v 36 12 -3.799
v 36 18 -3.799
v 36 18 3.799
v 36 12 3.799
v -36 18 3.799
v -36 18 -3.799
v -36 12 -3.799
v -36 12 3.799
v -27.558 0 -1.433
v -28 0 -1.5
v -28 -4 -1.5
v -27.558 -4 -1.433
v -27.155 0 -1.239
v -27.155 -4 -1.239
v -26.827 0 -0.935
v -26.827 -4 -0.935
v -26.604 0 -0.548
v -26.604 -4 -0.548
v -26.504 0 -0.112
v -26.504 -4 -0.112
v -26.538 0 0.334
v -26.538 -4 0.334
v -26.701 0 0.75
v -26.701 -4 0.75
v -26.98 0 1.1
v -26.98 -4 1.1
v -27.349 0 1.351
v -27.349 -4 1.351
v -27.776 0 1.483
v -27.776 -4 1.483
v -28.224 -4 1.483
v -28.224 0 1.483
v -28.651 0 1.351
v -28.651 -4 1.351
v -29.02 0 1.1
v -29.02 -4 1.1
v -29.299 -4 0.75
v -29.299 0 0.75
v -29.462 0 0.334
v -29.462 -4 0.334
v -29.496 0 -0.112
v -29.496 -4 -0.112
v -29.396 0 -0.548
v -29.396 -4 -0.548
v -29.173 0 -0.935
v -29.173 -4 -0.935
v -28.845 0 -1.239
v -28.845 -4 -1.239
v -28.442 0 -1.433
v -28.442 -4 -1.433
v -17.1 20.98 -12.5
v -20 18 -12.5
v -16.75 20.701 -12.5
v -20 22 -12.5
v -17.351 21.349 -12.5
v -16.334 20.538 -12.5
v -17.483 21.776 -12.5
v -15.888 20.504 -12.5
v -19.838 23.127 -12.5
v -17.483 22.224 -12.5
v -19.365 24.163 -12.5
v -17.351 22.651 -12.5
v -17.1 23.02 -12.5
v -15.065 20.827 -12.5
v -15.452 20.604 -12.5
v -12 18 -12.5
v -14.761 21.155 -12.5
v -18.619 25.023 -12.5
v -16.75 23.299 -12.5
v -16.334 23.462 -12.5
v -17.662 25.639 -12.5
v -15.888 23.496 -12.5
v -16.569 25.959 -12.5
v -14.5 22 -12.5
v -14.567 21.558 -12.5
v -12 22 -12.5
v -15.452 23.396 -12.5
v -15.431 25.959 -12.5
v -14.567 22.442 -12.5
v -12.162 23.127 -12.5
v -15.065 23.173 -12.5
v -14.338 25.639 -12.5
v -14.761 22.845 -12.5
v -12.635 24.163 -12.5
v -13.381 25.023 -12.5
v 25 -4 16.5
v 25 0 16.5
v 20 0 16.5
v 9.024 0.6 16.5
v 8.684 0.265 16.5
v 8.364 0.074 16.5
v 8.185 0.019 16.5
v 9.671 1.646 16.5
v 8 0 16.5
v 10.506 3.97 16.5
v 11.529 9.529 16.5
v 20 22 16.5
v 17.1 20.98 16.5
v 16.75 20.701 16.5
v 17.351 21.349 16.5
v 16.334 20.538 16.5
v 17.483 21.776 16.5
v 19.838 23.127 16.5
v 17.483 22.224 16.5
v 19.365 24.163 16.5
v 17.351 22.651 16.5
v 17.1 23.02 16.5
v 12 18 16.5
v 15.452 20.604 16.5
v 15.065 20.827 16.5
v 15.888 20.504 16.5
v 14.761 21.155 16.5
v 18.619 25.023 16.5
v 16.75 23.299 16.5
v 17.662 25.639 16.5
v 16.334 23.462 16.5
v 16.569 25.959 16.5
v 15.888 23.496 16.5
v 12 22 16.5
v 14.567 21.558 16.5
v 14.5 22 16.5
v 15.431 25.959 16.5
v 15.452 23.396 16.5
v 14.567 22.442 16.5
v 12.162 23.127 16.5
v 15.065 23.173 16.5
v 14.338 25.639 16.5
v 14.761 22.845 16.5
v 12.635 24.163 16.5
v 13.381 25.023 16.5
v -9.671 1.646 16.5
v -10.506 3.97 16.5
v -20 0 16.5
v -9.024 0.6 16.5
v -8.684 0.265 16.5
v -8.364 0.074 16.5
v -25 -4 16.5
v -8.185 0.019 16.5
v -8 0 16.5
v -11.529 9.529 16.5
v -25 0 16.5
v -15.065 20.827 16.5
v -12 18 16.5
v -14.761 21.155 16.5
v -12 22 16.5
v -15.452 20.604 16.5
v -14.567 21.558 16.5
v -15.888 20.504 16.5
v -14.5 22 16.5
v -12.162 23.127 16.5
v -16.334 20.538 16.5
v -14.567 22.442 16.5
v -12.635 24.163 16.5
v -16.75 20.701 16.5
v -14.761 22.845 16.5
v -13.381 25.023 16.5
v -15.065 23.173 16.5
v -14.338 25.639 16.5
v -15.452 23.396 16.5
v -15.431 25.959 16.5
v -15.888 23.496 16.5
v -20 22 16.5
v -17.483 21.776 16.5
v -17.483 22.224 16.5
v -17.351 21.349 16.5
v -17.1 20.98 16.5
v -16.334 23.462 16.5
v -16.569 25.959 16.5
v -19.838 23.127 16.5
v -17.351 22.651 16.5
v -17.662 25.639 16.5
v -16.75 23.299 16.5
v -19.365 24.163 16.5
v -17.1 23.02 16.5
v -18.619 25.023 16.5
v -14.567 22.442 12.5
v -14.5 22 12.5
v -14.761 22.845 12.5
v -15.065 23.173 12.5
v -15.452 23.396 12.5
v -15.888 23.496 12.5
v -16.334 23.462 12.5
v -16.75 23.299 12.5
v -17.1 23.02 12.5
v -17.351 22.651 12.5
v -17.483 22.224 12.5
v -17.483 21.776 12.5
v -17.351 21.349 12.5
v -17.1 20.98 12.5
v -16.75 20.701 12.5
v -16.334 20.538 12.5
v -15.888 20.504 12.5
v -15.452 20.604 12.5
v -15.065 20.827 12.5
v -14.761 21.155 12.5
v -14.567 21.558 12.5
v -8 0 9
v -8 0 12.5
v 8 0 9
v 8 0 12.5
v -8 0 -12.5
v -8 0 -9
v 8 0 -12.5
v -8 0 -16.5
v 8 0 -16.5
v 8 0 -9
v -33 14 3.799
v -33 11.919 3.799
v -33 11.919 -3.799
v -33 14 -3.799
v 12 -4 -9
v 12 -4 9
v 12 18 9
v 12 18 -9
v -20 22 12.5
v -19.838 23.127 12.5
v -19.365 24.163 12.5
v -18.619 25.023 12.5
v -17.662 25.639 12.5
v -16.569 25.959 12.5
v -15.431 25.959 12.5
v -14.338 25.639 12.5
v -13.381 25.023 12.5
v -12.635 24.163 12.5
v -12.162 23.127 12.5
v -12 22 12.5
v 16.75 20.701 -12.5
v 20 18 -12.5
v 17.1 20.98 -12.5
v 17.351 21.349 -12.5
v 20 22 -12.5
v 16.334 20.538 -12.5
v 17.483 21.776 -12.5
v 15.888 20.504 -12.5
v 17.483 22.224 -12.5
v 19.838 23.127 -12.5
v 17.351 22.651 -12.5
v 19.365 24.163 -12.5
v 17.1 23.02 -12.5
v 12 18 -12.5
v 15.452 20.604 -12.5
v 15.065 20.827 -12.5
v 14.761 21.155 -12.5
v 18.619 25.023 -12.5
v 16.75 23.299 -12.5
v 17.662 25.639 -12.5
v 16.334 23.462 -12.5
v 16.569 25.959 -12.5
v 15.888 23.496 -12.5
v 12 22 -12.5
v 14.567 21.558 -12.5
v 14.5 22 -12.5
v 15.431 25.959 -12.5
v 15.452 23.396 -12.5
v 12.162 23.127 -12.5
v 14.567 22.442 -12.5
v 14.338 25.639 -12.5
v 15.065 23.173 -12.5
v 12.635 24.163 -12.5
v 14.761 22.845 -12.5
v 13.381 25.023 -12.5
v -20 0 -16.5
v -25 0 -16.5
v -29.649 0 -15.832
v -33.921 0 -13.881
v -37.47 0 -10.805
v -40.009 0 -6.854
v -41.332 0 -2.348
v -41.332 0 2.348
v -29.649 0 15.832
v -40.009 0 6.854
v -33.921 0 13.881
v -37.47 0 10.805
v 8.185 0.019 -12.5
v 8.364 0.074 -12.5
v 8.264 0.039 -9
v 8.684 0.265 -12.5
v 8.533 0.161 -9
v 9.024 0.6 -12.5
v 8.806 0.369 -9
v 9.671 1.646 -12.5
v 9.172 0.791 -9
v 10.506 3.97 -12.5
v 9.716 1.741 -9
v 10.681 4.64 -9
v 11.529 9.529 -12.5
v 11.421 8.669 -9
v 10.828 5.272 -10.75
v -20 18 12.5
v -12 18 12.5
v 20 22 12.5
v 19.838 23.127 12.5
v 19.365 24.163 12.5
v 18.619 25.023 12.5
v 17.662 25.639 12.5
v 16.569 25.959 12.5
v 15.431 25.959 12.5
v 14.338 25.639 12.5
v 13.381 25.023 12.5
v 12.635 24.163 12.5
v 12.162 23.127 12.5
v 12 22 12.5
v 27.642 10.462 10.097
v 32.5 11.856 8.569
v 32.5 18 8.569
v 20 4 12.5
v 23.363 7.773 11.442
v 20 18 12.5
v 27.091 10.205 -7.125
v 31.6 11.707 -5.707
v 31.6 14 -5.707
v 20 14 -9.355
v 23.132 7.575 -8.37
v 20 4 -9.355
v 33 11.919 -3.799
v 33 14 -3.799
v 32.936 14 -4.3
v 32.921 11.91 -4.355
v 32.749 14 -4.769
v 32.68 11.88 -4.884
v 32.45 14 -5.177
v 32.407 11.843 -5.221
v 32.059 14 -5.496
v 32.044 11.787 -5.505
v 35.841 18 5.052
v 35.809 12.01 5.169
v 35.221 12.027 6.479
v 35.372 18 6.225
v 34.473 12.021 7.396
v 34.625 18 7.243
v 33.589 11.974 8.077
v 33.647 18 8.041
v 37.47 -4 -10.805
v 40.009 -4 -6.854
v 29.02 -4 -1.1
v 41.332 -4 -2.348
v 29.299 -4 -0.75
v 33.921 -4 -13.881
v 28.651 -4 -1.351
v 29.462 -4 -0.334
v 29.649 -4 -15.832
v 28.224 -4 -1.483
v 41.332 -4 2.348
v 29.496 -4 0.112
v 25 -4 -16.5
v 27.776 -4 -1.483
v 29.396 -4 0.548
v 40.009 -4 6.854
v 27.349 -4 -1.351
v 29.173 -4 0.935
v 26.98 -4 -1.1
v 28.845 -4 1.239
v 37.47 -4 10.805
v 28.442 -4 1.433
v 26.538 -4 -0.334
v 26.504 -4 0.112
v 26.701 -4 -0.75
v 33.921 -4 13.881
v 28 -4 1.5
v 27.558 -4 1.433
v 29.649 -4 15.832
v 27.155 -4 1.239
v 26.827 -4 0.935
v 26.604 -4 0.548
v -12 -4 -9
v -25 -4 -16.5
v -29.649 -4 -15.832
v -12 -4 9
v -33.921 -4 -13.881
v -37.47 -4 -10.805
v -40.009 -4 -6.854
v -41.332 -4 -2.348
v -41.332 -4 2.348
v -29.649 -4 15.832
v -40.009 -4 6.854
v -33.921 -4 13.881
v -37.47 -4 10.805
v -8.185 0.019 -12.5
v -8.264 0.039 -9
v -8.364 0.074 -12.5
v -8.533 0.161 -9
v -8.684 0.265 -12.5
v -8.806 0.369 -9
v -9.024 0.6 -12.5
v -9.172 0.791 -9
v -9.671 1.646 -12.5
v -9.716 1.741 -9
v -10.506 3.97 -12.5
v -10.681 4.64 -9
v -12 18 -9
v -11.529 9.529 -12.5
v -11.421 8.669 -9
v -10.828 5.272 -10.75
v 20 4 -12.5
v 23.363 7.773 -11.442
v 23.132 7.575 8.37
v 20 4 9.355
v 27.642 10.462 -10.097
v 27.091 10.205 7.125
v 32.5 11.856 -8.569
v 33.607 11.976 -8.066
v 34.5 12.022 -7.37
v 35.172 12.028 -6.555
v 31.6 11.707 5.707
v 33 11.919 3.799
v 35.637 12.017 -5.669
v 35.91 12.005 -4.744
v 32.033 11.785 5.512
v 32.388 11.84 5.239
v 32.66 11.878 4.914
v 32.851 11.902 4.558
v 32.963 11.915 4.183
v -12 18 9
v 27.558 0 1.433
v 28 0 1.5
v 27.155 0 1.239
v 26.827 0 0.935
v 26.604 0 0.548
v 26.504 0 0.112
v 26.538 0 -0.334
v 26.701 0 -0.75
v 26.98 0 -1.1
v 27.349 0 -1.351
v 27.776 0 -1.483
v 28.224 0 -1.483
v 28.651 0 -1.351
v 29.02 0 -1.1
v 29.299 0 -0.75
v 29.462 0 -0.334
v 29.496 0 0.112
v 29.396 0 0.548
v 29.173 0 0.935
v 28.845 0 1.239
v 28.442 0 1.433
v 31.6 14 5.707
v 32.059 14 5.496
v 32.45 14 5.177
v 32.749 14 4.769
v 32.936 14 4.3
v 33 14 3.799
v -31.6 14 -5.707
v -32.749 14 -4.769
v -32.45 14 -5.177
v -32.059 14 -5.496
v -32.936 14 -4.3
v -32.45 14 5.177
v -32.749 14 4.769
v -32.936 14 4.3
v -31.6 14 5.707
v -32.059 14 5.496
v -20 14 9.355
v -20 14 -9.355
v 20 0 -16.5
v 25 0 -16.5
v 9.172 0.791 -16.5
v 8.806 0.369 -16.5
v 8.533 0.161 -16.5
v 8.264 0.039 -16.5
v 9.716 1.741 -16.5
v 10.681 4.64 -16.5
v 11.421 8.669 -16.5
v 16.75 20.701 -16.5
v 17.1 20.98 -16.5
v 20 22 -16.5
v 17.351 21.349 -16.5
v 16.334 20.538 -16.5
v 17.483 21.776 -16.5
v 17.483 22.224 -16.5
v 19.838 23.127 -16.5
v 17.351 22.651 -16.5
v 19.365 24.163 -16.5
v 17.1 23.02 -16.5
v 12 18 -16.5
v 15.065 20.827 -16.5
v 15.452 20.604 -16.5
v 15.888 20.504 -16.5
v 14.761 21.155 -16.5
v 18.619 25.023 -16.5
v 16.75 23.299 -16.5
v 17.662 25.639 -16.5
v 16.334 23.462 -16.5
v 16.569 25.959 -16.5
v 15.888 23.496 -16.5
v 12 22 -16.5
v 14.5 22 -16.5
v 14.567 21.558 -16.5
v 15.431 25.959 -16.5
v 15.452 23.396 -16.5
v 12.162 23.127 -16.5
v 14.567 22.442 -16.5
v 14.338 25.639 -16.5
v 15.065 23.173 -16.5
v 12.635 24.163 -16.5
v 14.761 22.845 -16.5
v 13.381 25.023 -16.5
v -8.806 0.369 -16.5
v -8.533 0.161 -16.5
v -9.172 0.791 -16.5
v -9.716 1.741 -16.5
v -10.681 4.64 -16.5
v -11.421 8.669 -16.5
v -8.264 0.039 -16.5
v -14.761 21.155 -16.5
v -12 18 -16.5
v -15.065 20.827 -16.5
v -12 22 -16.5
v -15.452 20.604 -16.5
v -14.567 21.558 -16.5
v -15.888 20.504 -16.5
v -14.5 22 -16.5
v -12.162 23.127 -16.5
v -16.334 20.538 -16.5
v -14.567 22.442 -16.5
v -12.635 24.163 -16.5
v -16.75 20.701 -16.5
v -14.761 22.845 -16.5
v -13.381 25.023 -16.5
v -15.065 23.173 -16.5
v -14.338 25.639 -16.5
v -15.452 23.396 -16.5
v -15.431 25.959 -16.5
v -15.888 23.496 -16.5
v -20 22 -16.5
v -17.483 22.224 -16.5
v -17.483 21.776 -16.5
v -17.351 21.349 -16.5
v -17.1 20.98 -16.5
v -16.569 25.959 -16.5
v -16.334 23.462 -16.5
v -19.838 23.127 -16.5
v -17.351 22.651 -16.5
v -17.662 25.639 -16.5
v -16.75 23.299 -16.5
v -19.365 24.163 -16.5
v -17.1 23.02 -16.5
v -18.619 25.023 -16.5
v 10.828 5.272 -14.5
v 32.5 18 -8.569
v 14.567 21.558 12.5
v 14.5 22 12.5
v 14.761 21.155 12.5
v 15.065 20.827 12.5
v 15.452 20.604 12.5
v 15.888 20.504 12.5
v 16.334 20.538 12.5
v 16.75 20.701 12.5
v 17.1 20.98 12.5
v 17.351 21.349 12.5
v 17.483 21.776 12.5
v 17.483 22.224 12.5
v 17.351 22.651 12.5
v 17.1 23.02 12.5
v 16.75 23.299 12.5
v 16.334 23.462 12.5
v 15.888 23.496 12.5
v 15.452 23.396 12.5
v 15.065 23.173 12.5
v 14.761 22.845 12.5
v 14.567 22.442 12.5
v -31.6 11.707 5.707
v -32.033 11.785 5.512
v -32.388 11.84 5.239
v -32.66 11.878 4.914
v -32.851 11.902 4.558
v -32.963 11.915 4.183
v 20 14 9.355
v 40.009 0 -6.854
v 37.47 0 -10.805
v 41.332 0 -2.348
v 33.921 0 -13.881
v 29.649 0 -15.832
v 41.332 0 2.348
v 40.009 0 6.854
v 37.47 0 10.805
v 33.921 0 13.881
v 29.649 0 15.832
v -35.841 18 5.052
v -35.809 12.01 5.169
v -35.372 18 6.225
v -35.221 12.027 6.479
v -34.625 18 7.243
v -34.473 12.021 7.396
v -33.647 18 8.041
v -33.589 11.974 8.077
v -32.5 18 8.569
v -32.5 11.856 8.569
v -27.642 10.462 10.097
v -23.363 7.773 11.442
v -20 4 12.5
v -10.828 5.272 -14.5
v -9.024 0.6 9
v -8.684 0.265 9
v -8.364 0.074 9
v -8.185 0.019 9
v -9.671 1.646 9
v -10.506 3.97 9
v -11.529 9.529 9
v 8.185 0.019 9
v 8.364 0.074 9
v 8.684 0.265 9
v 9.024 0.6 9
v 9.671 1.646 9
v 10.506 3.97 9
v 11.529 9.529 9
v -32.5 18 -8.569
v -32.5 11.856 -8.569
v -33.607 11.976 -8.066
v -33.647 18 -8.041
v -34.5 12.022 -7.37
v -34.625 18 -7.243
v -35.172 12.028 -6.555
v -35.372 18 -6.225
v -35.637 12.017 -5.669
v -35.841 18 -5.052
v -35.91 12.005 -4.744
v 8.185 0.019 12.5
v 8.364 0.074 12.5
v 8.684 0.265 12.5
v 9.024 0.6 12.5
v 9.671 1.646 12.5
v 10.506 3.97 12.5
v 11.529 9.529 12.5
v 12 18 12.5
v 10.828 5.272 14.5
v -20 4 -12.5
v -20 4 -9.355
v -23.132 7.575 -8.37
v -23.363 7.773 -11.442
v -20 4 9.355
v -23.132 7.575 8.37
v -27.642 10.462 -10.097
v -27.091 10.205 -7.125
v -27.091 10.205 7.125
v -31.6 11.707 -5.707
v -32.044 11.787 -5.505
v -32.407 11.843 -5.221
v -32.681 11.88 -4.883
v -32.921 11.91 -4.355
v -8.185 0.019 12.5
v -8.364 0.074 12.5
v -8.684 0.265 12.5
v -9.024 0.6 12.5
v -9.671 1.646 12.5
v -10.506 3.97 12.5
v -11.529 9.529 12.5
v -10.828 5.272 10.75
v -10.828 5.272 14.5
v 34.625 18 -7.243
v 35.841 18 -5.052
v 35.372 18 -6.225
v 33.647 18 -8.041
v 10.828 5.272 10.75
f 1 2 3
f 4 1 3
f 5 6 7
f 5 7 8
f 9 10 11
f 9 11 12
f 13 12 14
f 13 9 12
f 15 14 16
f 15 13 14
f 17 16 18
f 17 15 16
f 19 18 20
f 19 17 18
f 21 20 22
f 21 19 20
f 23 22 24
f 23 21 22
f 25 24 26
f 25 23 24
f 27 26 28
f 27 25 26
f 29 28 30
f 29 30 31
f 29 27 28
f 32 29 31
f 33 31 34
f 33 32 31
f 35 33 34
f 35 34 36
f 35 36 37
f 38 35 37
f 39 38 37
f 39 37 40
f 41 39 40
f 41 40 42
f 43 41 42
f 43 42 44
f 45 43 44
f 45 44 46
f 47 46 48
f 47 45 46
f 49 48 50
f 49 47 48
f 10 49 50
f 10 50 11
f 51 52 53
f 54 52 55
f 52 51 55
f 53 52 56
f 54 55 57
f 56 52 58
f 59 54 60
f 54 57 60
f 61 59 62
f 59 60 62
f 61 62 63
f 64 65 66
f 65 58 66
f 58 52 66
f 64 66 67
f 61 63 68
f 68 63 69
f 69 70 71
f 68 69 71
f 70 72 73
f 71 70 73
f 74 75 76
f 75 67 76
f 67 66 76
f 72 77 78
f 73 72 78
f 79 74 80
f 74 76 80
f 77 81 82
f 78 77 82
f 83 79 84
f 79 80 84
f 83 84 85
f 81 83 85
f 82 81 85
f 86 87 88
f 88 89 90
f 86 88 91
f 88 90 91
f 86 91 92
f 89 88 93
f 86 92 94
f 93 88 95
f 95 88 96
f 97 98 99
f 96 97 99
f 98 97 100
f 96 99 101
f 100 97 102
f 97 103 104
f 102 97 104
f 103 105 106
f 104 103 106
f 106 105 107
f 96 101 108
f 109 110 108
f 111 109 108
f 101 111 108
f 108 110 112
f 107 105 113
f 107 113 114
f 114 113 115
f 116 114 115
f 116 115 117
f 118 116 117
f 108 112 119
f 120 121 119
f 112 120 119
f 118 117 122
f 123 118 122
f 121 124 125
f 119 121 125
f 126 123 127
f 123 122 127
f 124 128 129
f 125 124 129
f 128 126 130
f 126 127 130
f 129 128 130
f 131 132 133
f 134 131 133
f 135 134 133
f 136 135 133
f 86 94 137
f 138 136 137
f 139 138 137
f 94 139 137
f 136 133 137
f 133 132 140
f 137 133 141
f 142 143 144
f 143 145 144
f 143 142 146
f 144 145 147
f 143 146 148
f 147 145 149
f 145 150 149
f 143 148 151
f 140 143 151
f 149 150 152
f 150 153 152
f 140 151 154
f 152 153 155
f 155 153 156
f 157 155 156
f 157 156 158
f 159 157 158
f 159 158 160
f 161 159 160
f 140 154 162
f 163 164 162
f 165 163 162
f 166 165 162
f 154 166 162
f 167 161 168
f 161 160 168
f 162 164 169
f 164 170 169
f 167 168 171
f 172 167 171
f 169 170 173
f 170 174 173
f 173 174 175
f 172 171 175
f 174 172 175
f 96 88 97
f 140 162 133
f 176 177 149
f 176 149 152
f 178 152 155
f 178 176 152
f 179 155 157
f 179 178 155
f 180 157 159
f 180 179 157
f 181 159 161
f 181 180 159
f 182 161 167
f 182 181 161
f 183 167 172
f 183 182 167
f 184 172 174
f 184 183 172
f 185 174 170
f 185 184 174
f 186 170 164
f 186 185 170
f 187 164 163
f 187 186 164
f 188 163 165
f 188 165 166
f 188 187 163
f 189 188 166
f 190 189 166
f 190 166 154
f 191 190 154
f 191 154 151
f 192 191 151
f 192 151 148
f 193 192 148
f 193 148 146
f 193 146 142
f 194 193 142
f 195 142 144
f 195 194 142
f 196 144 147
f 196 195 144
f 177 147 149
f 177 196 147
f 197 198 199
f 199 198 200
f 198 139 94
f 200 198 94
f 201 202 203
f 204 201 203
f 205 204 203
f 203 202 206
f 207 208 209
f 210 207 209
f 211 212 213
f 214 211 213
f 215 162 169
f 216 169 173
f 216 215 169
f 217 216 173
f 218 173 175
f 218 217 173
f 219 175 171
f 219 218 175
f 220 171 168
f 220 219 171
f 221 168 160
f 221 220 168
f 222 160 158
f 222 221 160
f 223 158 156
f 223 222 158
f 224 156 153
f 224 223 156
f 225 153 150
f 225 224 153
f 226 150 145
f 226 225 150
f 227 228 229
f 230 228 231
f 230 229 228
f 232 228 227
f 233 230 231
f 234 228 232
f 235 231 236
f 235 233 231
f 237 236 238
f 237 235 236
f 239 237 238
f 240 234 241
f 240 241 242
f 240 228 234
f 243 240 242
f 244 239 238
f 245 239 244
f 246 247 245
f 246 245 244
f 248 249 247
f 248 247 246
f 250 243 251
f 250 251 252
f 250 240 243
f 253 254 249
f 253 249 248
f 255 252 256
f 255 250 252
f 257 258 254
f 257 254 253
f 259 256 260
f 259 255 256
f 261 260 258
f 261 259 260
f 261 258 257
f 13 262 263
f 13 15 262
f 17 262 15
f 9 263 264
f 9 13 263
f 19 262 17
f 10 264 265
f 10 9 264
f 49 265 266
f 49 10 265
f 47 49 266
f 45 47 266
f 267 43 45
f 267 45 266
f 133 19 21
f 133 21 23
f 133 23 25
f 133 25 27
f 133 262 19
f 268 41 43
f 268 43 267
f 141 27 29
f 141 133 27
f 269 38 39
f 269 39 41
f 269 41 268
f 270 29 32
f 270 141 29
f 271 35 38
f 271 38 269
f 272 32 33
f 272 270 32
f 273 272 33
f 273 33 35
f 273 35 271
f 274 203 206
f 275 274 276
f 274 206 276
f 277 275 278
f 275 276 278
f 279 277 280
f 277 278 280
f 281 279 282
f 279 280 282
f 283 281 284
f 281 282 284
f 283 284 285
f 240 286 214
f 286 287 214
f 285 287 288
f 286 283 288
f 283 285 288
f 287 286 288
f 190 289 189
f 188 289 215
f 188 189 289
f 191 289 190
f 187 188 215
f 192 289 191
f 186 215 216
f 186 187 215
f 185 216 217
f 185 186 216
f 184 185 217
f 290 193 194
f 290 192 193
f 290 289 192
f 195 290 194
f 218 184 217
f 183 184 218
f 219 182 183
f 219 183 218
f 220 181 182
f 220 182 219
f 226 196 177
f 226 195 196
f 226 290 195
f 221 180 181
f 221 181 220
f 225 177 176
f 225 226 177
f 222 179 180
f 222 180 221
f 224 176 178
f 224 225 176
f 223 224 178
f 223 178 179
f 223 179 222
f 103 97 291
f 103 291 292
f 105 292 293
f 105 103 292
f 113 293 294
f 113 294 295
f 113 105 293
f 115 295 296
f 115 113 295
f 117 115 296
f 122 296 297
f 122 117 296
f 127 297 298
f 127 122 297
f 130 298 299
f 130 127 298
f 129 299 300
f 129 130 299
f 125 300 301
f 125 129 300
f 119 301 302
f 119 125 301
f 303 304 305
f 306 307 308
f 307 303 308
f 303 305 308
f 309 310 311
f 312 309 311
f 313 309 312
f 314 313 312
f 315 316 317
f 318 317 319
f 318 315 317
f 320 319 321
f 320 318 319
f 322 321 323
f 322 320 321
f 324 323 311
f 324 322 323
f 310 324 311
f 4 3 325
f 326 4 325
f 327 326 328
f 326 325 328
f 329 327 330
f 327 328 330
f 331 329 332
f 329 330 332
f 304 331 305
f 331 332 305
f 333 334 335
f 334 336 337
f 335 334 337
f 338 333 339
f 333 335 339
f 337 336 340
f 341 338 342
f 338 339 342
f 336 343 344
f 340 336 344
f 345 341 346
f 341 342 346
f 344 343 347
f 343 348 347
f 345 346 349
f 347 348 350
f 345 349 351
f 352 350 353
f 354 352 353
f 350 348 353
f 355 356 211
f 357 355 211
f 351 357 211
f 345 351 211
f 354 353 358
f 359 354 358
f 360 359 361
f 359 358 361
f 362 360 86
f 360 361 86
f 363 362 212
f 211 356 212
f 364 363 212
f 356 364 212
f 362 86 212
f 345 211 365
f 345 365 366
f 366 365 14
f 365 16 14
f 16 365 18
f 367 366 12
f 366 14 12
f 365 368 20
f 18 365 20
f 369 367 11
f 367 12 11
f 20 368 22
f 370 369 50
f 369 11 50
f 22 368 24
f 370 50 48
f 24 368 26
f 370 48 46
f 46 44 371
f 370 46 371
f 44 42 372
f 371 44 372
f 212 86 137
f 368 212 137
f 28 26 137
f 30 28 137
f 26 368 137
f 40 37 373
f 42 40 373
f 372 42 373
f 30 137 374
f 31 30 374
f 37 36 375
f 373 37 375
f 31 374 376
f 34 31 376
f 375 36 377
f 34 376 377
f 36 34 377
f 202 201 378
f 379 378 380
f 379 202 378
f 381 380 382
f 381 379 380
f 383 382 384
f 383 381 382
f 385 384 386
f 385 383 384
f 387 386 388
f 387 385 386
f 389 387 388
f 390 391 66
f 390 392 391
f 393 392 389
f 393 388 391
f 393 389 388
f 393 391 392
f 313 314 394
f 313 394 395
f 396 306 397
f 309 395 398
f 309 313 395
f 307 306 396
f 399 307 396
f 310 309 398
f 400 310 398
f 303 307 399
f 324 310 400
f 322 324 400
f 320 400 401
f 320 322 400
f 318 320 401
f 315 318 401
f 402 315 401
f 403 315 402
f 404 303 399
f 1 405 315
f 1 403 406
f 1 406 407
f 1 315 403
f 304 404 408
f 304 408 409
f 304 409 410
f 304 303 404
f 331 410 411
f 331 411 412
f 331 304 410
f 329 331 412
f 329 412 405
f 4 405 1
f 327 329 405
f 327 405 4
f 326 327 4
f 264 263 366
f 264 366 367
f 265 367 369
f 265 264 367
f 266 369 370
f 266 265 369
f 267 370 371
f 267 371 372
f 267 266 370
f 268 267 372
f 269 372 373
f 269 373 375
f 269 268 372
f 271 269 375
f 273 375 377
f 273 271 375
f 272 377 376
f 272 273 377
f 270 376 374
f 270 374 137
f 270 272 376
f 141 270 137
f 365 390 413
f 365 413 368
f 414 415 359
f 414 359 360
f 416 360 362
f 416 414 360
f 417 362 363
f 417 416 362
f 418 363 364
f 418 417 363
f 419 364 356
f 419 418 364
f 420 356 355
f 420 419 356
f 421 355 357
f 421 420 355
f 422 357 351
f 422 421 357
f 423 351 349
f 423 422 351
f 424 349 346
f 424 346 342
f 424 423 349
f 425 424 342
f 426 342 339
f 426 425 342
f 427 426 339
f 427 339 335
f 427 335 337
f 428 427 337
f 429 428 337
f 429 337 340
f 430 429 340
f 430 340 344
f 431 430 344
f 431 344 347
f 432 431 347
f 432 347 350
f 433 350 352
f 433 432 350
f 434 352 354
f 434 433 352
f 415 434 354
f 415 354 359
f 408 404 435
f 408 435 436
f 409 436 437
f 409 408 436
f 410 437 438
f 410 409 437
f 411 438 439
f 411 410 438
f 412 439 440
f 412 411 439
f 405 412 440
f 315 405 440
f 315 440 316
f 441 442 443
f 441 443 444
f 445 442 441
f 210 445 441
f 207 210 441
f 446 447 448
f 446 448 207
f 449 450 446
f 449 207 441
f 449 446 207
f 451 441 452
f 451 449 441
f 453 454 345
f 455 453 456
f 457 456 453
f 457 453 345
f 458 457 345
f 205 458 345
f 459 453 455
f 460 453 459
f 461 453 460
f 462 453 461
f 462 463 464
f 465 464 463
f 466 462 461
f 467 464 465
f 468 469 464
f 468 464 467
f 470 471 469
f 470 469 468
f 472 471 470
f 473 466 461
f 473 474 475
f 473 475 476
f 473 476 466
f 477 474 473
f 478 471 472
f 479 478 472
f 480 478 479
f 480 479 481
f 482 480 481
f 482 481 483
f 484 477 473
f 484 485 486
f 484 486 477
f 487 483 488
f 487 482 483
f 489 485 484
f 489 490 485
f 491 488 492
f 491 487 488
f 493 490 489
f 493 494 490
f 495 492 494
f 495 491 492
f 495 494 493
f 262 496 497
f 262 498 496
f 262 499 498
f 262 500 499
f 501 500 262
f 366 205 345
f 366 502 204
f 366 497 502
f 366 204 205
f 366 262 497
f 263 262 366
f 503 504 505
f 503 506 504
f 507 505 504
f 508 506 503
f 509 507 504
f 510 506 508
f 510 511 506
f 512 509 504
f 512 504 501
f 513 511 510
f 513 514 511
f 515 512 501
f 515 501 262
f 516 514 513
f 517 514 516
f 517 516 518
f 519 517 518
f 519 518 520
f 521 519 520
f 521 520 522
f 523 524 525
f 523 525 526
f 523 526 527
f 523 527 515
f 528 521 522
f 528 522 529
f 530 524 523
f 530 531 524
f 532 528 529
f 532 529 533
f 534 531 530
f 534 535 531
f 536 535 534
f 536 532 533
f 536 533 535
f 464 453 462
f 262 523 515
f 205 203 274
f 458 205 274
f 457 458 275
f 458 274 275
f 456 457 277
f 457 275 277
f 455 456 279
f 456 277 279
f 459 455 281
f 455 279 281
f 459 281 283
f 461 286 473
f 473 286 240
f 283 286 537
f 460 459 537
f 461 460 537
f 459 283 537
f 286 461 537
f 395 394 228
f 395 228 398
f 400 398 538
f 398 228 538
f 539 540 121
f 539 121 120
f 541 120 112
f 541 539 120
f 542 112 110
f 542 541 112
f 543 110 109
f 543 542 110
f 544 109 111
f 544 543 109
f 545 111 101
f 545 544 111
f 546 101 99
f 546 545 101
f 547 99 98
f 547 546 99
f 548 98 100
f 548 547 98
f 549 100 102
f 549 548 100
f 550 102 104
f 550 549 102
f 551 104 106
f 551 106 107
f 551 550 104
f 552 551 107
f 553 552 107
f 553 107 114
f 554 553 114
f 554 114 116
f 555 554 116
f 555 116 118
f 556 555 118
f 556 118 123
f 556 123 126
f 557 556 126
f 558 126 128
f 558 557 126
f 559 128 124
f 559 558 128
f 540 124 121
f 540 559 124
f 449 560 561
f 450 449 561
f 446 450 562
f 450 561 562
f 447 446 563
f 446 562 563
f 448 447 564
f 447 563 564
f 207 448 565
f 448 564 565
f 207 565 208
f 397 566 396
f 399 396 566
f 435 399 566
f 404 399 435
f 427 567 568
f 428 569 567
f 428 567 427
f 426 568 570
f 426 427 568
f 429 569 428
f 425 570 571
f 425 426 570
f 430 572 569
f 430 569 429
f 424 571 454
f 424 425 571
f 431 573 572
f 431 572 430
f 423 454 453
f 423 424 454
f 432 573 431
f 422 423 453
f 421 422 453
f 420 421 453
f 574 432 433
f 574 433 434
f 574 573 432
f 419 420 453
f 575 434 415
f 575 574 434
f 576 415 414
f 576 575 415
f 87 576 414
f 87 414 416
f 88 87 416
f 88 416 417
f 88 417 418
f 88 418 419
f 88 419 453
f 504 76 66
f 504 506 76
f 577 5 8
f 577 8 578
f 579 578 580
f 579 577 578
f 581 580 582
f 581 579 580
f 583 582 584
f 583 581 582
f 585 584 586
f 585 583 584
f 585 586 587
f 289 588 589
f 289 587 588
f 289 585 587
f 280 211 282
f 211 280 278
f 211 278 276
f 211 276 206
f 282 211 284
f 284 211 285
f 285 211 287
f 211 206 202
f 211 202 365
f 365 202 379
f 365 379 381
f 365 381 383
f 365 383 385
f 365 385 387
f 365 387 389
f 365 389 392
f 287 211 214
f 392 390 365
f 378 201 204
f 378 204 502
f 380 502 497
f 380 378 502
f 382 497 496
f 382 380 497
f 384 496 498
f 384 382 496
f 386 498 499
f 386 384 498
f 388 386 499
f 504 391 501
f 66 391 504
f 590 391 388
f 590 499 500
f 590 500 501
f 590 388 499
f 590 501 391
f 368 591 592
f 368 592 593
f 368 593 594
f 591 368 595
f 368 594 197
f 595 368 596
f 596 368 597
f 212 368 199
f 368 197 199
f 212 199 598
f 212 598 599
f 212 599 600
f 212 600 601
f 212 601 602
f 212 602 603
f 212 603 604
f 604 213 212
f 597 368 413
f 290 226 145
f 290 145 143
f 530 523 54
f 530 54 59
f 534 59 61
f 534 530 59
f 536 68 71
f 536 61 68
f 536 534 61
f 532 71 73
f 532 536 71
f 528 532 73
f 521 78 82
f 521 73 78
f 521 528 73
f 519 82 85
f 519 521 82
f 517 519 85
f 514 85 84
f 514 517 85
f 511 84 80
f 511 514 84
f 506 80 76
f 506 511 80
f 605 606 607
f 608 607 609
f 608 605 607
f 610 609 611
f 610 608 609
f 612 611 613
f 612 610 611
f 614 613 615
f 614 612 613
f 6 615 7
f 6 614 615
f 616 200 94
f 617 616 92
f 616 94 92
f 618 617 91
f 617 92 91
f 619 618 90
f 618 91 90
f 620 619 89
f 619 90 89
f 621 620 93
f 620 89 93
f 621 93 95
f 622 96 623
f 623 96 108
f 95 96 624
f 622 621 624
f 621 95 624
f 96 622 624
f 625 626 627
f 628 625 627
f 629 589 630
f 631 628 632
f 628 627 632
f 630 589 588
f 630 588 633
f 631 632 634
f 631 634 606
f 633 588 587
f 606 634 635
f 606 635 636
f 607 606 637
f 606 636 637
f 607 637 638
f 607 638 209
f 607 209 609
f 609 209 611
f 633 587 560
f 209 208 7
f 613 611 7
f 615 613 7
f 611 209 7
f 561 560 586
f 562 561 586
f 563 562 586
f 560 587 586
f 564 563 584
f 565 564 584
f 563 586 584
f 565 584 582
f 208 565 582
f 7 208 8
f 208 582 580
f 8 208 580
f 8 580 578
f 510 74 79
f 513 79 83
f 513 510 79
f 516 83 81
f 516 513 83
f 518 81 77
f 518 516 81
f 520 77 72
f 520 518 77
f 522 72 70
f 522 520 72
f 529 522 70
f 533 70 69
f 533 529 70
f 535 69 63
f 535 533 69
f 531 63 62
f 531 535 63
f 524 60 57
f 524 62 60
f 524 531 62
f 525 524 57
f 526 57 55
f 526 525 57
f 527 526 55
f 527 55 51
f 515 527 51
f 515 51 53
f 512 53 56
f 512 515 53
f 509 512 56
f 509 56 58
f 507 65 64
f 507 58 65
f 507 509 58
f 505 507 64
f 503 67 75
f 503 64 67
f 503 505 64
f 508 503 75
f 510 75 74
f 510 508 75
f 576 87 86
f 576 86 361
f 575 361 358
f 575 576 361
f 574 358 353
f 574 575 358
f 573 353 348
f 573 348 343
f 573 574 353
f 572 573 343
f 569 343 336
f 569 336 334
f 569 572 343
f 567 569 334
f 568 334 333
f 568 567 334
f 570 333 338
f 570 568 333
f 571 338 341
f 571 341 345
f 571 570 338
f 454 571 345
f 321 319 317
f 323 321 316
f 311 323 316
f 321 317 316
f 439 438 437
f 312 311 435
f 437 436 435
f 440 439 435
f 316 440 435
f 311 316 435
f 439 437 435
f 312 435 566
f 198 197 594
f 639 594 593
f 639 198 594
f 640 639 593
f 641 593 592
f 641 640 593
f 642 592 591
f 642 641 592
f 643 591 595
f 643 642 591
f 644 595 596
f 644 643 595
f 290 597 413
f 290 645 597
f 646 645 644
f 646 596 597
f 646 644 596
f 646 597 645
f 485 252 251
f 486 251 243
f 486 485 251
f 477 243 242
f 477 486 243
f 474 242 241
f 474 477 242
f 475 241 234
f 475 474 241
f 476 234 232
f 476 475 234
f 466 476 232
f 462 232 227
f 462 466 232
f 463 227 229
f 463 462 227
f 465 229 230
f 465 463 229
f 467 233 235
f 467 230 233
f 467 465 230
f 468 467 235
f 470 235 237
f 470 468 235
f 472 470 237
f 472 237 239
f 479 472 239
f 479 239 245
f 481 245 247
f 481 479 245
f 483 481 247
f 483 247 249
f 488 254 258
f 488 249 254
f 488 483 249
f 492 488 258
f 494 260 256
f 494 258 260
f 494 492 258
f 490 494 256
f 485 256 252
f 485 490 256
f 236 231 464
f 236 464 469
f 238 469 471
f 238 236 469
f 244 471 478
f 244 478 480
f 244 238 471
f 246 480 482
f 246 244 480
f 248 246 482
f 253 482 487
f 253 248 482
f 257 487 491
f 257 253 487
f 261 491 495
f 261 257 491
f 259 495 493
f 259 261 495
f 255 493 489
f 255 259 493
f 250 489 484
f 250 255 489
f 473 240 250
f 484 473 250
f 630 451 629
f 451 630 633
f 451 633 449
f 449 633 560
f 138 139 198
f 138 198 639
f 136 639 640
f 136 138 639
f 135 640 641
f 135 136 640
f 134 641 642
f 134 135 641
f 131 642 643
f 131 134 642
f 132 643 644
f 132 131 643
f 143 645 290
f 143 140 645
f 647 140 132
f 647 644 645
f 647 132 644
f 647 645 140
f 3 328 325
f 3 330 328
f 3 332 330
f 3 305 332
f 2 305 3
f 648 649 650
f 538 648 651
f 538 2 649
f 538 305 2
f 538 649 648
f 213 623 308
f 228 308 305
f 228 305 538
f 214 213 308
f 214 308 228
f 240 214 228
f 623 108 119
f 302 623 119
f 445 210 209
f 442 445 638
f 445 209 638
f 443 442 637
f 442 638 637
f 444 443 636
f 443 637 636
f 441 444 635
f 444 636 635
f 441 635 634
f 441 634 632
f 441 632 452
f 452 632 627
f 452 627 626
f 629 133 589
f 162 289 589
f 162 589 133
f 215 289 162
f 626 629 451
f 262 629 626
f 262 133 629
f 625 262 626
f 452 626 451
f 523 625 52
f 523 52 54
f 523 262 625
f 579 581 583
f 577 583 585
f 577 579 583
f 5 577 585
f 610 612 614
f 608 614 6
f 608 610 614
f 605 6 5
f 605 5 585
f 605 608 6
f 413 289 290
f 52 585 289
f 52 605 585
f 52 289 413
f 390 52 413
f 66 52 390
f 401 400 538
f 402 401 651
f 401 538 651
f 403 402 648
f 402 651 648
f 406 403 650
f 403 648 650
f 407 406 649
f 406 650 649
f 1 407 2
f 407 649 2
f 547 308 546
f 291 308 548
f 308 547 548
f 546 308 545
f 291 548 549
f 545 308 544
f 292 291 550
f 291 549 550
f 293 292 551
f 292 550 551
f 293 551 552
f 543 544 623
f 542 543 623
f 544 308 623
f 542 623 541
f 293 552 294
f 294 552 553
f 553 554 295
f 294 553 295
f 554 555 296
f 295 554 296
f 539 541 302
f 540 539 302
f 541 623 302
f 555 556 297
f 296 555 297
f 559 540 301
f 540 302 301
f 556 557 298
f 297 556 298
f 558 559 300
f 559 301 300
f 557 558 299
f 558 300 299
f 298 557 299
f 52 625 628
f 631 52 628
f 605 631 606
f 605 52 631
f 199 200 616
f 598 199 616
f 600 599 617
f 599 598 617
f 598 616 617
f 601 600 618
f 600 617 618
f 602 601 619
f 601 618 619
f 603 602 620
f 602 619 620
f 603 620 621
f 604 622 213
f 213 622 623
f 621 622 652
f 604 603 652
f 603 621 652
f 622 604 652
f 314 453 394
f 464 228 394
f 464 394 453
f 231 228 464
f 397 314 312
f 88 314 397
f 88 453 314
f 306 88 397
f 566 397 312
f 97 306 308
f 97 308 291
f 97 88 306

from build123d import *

# Parameters (mm, degrees)
SKETCH1_W                      = 32
SKETCH1_H                      = 33
BOSS_EXTRUDE1_DEPTH            = 18
SHELL1_T                       = -4
SKETCH2_R                      = 1.5
BOSS_EXTRUDE2_DEPTH            = 16.5
CUT_EXTRUDE5_REACH             = 46.41
SKETCH10_W                     = 25
SKETCH10_H                     = 8
CUT_EXTRUDE5_DIRECTION_2_REACH = 46.41
BOSS_EXTRUDE3_DEPTH            = 14
CUT_EXTRUDE6_DEPTH             = 10
CUT_EXTRUDE7_REACH             = 57.326
SKETCH15_R                     = 1.5
BOSS_EXTRUDE5_DEPTH            = 4
SKETCH9_W                      = 24
SKETCH9_H                      = 18
CUT_EXTRUDE4_DEPTH             = 50.784535752
SKETCH16_W                     = 24
SKETCH16_H                     = 18
CUT_EXTRUDE8_DEPTH             = 60.052942348
FILLET1_SIZE                   = 4
FILLET1_SIZE_2                 = 18
FILLET2_SIZE                   = 4
FILLET2_SIZE_2                 = 18


with BuildPart() as part:
    # Sketch1 → Boss-Extrude1 (new body)
    with BuildSketch(Plane(origin=(0, 0, 0), x_dir=(1, 0, 0), z_dir=(0, 1, 0))):
        Rectangle(SKETCH1_W, SKETCH1_H)
    extrude(amount=BOSS_EXTRUDE1_DEPTH)

    # Shell1
    shell1_openings = [part.faces().sort_by_distance(p)[0] for p in [
        (0, 18, 0),
    ]]
    offset(amount=SHELL1_T, openings=shell1_openings, kind=Kind.INTERSECTION)

    # Sketch2 → Boss-Extrude2 (add, symmetric)
    # profile 1 of 2: a face of its own
    with BuildSketch(Plane.XY):
        with BuildLine():
            Line((-16, 0), (-20, 0))
            Line((-20, 0), (-20, 22))
            ThreePointArc((-20, 22), (-16, 26), (-12, 22))
            Line((-12, 22), (-12, 18))
            Line((-12, 18), (-16, 18))
            Line((-16, 18), (-16, 0))
        make_face()
        with Locations((-16, 22)):
            Circle(SKETCH2_R, mode=Mode.SUBTRACT)
    # profile 2 of 2: a face of its own
    with BuildSketch(Plane.XY):
        with BuildLine():
            Line((16, 18), (16, 0))
            Line((16, 0), (20, 0))
            Line((20, 0), (20, 22))
            ThreePointArc((20, 22), (16, 26), (12, 22))
            Line((12, 22), (12, 18))
            Line((12, 18), (16, 18))
        make_face()
        with Locations(Location((16, 22, 0), (0, 0, 180))):
            Circle(SKETCH2_R, mode=Mode.SUBTRACT)
    extrude(amount=BOSS_EXTRUDE2_DEPTH, both=True)

    # Sketch10 → Cut-Extrude5 (cut, up to next)
    with BuildSketch(Plane(origin=(-12, 0, 0), x_dir=(0, 0, -1), z_dir=(1, 0, 0)), mode=Mode.PRIVATE) as cut_extrude5_sk1:
        with Locations((0, 22)):
            Rectangle(SKETCH10_W, SKETCH10_H)
    cut_extrude5_tool1 = extrude(cut_extrude5_sk1.sketch, amount=-CUT_EXTRUDE5_REACH, mode=Mode.PRIVATE) & part.part
    add(cut_extrude5_tool1.solids().sort_by_distance((-12, 22, 0))[0], mode=Mode.SUBTRACT)

    # Sketch10 → Cut-Extrude5 direction 2 (cut, up to next)
    with BuildSketch(Plane(origin=(-12, 0, 0), x_dir=(0, 0, -1), z_dir=(1, 0, 0)), mode=Mode.PRIVATE) as cut_extrude5_direction_2_sk1:
        with Locations((0, 22)):
            Rectangle(SKETCH10_W, SKETCH10_H)
    cut_extrude5_direction_2_tool1 = extrude(cut_extrude5_direction_2_sk1.sketch, amount=CUT_EXTRUDE5_DIRECTION_2_REACH, mode=Mode.PRIVATE) & part.part
    add(cut_extrude5_direction_2_tool1.solids().sort_by_distance((-12, 22, 0))[0], mode=Mode.SUBTRACT)

    # Sketch11 → Boss-Extrude3 (add)
    with BuildSketch(Plane(origin=(0, 18, 0), x_dir=(1, 0, 0), z_dir=(0, 1, 0))):
        with BuildLine():
            Line((-20, 12.5), (-32.5, 8.568931862))
            ThreePointArc((-32.5, 8.568931862), (-35.031128874, 6.757275747), (-36, 3.799235855))
            Line((-36, 3.799235855), (-36, -3.799235855))
            ThreePointArc((-36, -3.799235855), (-35.031128874, -6.757275747), (-32.5, -8.568931862))
            Line((-32.5, -8.568931862), (-20, -12.5))
            Line((-20, -12.5), (-20, 12.5))
        make_face()
        with BuildLine():
            Line((32.5, -8.568931862), (20, -12.5))
            Line((20, -12.5), (20, 12.5))
            Line((20, 12.5), (32.5, 8.568931862))
            ThreePointArc((32.5, 8.568931862), (35.031128874, 6.757275747), (36, 3.799235855))
            Line((36, 3.799235855), (36, -3.799235855))
            ThreePointArc((36, -3.799235855), (35.031128874, -6.757275747), (32.5, -8.568931862))
        make_face()
    extrude(amount=-BOSS_EXTRUDE3_DEPTH)

    # Sketch12 → Cut-Extrude6 (cut)
    with BuildSketch(Plane.XZ.offset(-4)):
        with BuildLine():
            Line((-20, -9.35514549), (-20, 9.35514549))
            Line((-20, 9.35514549), (-31.6, 5.707114258))
            ThreePointArc((-31.6, 5.707114258), (-32.61245155, 4.982451812), (-33, 3.799235855))
            Line((-33, 3.799235855), (-33, -3.799235855))
            ThreePointArc((-33, -3.799235855), (-32.61245155, -4.982451812), (-31.6, -5.707114258))
            Line((-31.6, -5.707114258), (-20, -9.35514549))
        make_face()
        with BuildLine():
            Line((31.6, -5.707114258), (20, -9.35514549))
            Line((20, -9.35514549), (20, 9.35514549))
            Line((20, 9.35514549), (31.6, 5.707114258))
            ThreePointArc((31.6, 5.707114258), (32.61245155, 4.982451812), (33, 3.799235855))
            Line((33, 3.799235855), (33, -3.799235855))
            ThreePointArc((33, -3.799235855), (32.61245155, -4.982451812), (31.6, -5.707114258))
        make_face()
    extrude(amount=-CUT_EXTRUDE6_DEPTH, mode=Mode.SUBTRACT)

    # Sketch13 → Cut-Extrude7 (cut, up to next)
    with BuildSketch(Plane.XY.offset(16.5), mode=Mode.PRIVATE) as cut_extrude7_sk1:
        with BuildLine():
            Line((-36, 12), (-36, 4))
            Line((-36, 4), (-20, 4))
            ThreePointArc((-20, 4), (-26.93585496, 10.128290081), (-36, 12))
        make_face()
    cut_extrude7_tool1 = extrude(cut_extrude7_sk1.sketch, amount=-CUT_EXTRUDE7_REACH, mode=Mode.PRIVATE) & part.part
    # Sketch13 → Cut-Extrude7 (cut, up to next)
    with BuildSketch(Plane.XY.offset(16.5), mode=Mode.PRIVATE) as cut_extrude7_sk2:
        with BuildLine():
            Line((36, 4), (20, 4))
            ThreePointArc((20, 4), (26.93585496, 10.128290081), (36, 12))
            Line((36, 12), (36, 4))
        make_face()
    cut_extrude7_tool2 = extrude(cut_extrude7_sk2.sketch, amount=-CUT_EXTRUDE7_REACH, mode=Mode.PRIVATE) & part.part
    add(cut_extrude7_tool1.solids().sort_by_distance((-29.706779, 7.345809, 16.5))[0], mode=Mode.SUBTRACT)
    add(cut_extrude7_tool2.solids().sort_by_distance((29.706779, 7.345809, 16.5))[0], mode=Mode.SUBTRACT)

    # Sketch15 → Boss-Extrude5 (add)
    with BuildSketch(Plane.XZ):
        with BuildLine():
            Line((-25, 16.5), (25, 16.5))
            ThreePointArc((25, 16.5), (41.5, 0), (25, -16.5))
            Line((25, -16.5), (-25, -16.5))
            ThreePointArc((-25, -16.5), (-41.5, 0), (-25, 16.5))
        make_face()
        with Locations(Location((-28, 0, 0), (0, 0, 270))):
            Circle(SKETCH15_R, mode=Mode.SUBTRACT)
        with Locations(Location((28, 0, 0), (0, 0, 90))):
            Circle(SKETCH15_R, mode=Mode.SUBTRACT)
    extrude(amount=BOSS_EXTRUDE5_DEPTH)

    # Sketch9 → Cut-Extrude4 (cut, through all)
    with BuildSketch(Plane(origin=(0, 4, 0), x_dir=(1, 0, 0), z_dir=(0, 1, 0))):
        Rectangle(SKETCH9_W, SKETCH9_H)
    extrude(amount=-CUT_EXTRUDE4_DEPTH, mode=Mode.SUBTRACT)

    # Sketch16 → Cut-Extrude8 (cut, through all)
    with BuildSketch(Plane.XY.offset(16.5)):
        with Locations((0, 9)):
            Rectangle(SKETCH16_W, SKETCH16_H)
    extrude(amount=-CUT_EXTRUDE8_DEPTH, mode=Mode.SUBTRACT)

    # Fillet1
    # an asymmetric fillet: 18, 4 mm, written as the material it adds along each edge
    with BuildSketch(Plane(origin=(-12, 0, 36), x_dir=(1, 0, 0), z_dir=(0, 0, -1))) as fillet1_piece_1_section:
        with BuildLine():
            Bezier((FILLET1_SIZE, 0), (0, 0), (0, -FILLET1_SIZE_2), weights=[1, 0.707106781, 1])
            Line((0, -FILLET1_SIZE_2), (0, 0))
            Line((0, 0), (FILLET1_SIZE, 0))
        make_face()
    fillet1_piece_1 = extrude(amount=52.5, mode=Mode.PRIVATE)
    fillet1_piece_1 = split(fillet1_piece_1, bisect_by=Plane(origin=(-11.340639328, 5.113051829, 12.5), z_dir=(0, 0, 1)), keep=Keep.TOP, mode=Mode.PRIVATE)
    fillet1_piece_1 = split(fillet1_piece_1, bisect_by=Plane(origin=(-11.340639328, 5.113051829, 16.5), z_dir=(0, 0, -1)), keep=Keep.TOP, mode=Mode.PRIVATE)
    add(fillet1_piece_1)
    with BuildSketch(Plane(origin=(-12, 0, 36), x_dir=(1, 0, 0), z_dir=(0, 0, -1))) as fillet1_piece_2_section:
        with BuildLine():
            Bezier((FILLET1_SIZE, 0), (0, 0), (0, -FILLET1_SIZE_2), weights=[1, 0.707106781, 1])
            Line((0, -FILLET1_SIZE_2), (0, 0))
            Line((0, 0), (FILLET1_SIZE, 0))
        make_face()
    fillet1_piece_2 = extrude(amount=52.5, mode=Mode.PRIVATE)
    fillet1_piece_2 = split(fillet1_piece_2, bisect_by=Plane(origin=(-11.340638818, 5.113050372, 12.5), z_dir=(0, 0, -1)), keep=Keep.TOP, mode=Mode.PRIVATE)
    fillet1_piece_2 = split(fillet1_piece_2, bisect_by=Plane(origin=(-11.340638818, 5.113050372, 9), z_dir=(0, 0, 1)), keep=Keep.TOP, mode=Mode.PRIVATE)
    add(fillet1_piece_2)
    with BuildSketch(Plane(origin=(-12, 0, -9), x_dir=(1, 0, 0), z_dir=(0, 0, -1))) as fillet1_piece_3_section:
        with BuildLine():
            Bezier((FILLET1_SIZE, 0), (0, 0), (0, -FILLET1_SIZE_2), weights=[1, 0.707106781, 1])
            Line((0, -FILLET1_SIZE_2), (0, 0))
            Line((0, 0), (FILLET1_SIZE, 0))
        make_face()
    fillet1_piece_3 = extrude(amount=7.5, mode=Mode.PRIVATE)
    fillet1_piece_3 = split(fillet1_piece_3, bisect_by=Plane(origin=(-11.340634928, 5.11305877, -12.5), z_dir=(0, 0, 1)), keep=Keep.TOP, mode=Mode.PRIVATE)
    add(fillet1_piece_3)
    with BuildSketch(Plane(origin=(-12, 0, -9), x_dir=(1, 0, 0), z_dir=(0, 0, -1))) as fillet1_piece_4_section:
        with BuildLine():
            Bezier((FILLET1_SIZE, 0), (0, 0), (0, -FILLET1_SIZE_2), weights=[1, 0.707106781, 1])
            Line((0, -FILLET1_SIZE_2), (0, 0))
            Line((0, 0), (FILLET1_SIZE, 0))
        make_face()
    fillet1_piece_4 = extrude(amount=7.5, mode=Mode.PRIVATE)
    fillet1_piece_4 = split(fillet1_piece_4, bisect_by=Plane(origin=(-11.340634418, 5.113057313, -12.5), z_dir=(0, 0, -1)), keep=Keep.TOP, mode=Mode.PRIVATE)
    add(fillet1_piece_4)
    with BuildSketch(Plane(origin=(-12, 0, 16.5), x_dir=(1, 0, 0), z_dir=(0, 0, -1))) as fillet1_piece_5_section:
        with BuildLine():
            Bezier((FILLET1_SIZE, 0), (0, 0), (0, -FILLET1_SIZE_2), weights=[1, 0.707106781, 1])
            Line((0, -FILLET1_SIZE_2), (0, 0))
            Line((0, 0), (FILLET1_SIZE, 0))
        make_face()
    fillet1_piece_5 = extrude(amount=7.5, mode=Mode.PRIVATE)
    fillet1_piece_5 = split(fillet1_piece_5, bisect_by=Plane(origin=(-11.340639328, 5.113051829, 12.5), z_dir=(0, 0, 1)), keep=Keep.TOP, mode=Mode.PRIVATE)
    add(fillet1_piece_5)
    with BuildSketch(Plane(origin=(-12, 0, 16.5), x_dir=(1, 0, 0), z_dir=(0, 0, -1))) as fillet1_piece_6_section:
        with BuildLine():
            Bezier((FILLET1_SIZE, 0), (0, 0), (0, -FILLET1_SIZE_2), weights=[1, 0.707106781, 1])
            Line((0, -FILLET1_SIZE_2), (0, 0))
            Line((0, 0), (FILLET1_SIZE, 0))
        make_face()
    fillet1_piece_6 = extrude(amount=7.5, mode=Mode.PRIVATE)
    fillet1_piece_6 = split(fillet1_piece_6, bisect_by=Plane(origin=(-11.340638818, 5.113050372, 12.5), z_dir=(0, 0, -1)), keep=Keep.TOP, mode=Mode.PRIVATE)
    add(fillet1_piece_6)
    with BuildSketch(Plane(origin=(-12, 0, 16.5), x_dir=(1, 0, 0), z_dir=(0, 0, -1))) as fillet1_piece_7_section:
        with BuildLine():
            Bezier((FILLET1_SIZE, 0), (0, 0), (0, -FILLET1_SIZE_2), weights=[1, 0.707106781, 1])
            Line((0, -FILLET1_SIZE_2), (0, 0))
            Line((0, 0), (FILLET1_SIZE, 0))
        make_face()
    fillet1_piece_7 = extrude(amount=52.5, mode=Mode.PRIVATE)
    fillet1_piece_7 = split(fillet1_piece_7, bisect_by=Plane(origin=(-11.340634928, 5.11305877, -12.5), z_dir=(0, 0, 1)), keep=Keep.TOP, mode=Mode.PRIVATE)
    fillet1_piece_7 = split(fillet1_piece_7, bisect_by=Plane(origin=(-11.340634928, 5.11305877, -9), z_dir=(0, 0, -1)), keep=Keep.TOP, mode=Mode.PRIVATE)
    add(fillet1_piece_7)
    with BuildSketch(Plane(origin=(-12, 0, 16.5), x_dir=(1, 0, 0), z_dir=(0, 0, -1))) as fillet1_piece_8_section:
        with BuildLine():
            Bezier((FILLET1_SIZE, 0), (0, 0), (0, -FILLET1_SIZE_2), weights=[1, 0.707106781, 1])
            Line((0, -FILLET1_SIZE_2), (0, 0))
            Line((0, 0), (FILLET1_SIZE, 0))
        make_face()
    fillet1_piece_8 = extrude(amount=52.5, mode=Mode.PRIVATE)
    fillet1_piece_8 = split(fillet1_piece_8, bisect_by=Plane(origin=(-11.340634418, 5.113057313, -16.5), z_dir=(0, 0, 1)), keep=Keep.TOP, mode=Mode.PRIVATE)
    fillet1_piece_8 = split(fillet1_piece_8, bisect_by=Plane(origin=(-11.340634418, 5.113057313, -12.5), z_dir=(0, 0, -1)), keep=Keep.TOP, mode=Mode.PRIVATE)
    add(fillet1_piece_8)

    # Fillet2
    # an asymmetric fillet: 18, 4 mm, written as the material it adds along each edge
    with BuildSketch(Plane(origin=(12, 0, 36), x_dir=(-1, 0, 0), z_dir=(0, 0, -1))) as fillet2_piece_1_section:
        with BuildLine():
            Bezier((FILLET2_SIZE, 0), (0, 0), (0, FILLET2_SIZE_2), weights=[1, 0.707106781, 1])
            Line((0, FILLET2_SIZE_2), (0, 0))
            Line((0, 0), (FILLET2_SIZE, 0))
        make_face()
    fillet2_piece_1 = extrude(amount=52.5, mode=Mode.PRIVATE)
    fillet2_piece_1 = split(fillet2_piece_1, bisect_by=Plane(origin=(11.340639328, 5.113051829, 16.5), z_dir=(0, 0, -1)), keep=Keep.TOP, mode=Mode.PRIVATE)
    fillet2_piece_1 = split(fillet2_piece_1, bisect_by=Plane(origin=(11.340639328, 5.113051829, 12.5), z_dir=(0, 0, 1)), keep=Keep.TOP, mode=Mode.PRIVATE)
    add(fillet2_piece_1)
    with BuildSketch(Plane(origin=(12, 0, 36), x_dir=(-1, 0, 0), z_dir=(0, 0, -1))) as fillet2_piece_2_section:
        with BuildLine():
            Bezier((FILLET2_SIZE, 0), (0, 0), (0, FILLET2_SIZE_2), weights=[1, 0.707106781, 1])
            Line((0, FILLET2_SIZE_2), (0, 0))
            Line((0, 0), (FILLET2_SIZE, 0))
        make_face()
    fillet2_piece_2 = extrude(amount=52.5, mode=Mode.PRIVATE)
    fillet2_piece_2 = split(fillet2_piece_2, bisect_by=Plane(origin=(11.340638818, 5.113050372, 12.5), z_dir=(0, 0, -1)), keep=Keep.TOP, mode=Mode.PRIVATE)
    fillet2_piece_2 = split(fillet2_piece_2, bisect_by=Plane(origin=(11.340638818, 5.113050372, 9), z_dir=(0, 0, 1)), keep=Keep.TOP, mode=Mode.PRIVATE)
    add(fillet2_piece_2)
    with BuildSketch(Plane(origin=(12, 0, -9), x_dir=(-1, 0, 0), z_dir=(0, 0, -1))) as fillet2_piece_3_section:
        with BuildLine():
            Bezier((FILLET2_SIZE, 0), (0, 0), (0, FILLET2_SIZE_2), weights=[1, 0.707106781, 1])
            Line((0, FILLET2_SIZE_2), (0, 0))
            Line((0, 0), (FILLET2_SIZE, 0))
        make_face()
    fillet2_piece_3 = extrude(amount=7.5, mode=Mode.PRIVATE)
    fillet2_piece_3 = split(fillet2_piece_3, bisect_by=Plane(origin=(11.340634928, 5.11305877, -12.5), z_dir=(0, 0, 1)), keep=Keep.TOP, mode=Mode.PRIVATE)
    add(fillet2_piece_3)
    with BuildSketch(Plane(origin=(12, 0, -9), x_dir=(-1, 0, 0), z_dir=(0, 0, -1))) as fillet2_piece_4_section:
        with BuildLine():
            Bezier((FILLET2_SIZE, 0), (0, 0), (0, FILLET2_SIZE_2), weights=[1, 0.707106781, 1])
            Line((0, FILLET2_SIZE_2), (0, 0))
            Line((0, 0), (FILLET2_SIZE, 0))
        make_face()
    fillet2_piece_4 = extrude(amount=7.5, mode=Mode.PRIVATE)
    fillet2_piece_4 = split(fillet2_piece_4, bisect_by=Plane(origin=(11.340634928, 5.11305877, -12.5), z_dir=(0, 0, -1)), keep=Keep.TOP, mode=Mode.PRIVATE)
    add(fillet2_piece_4)
    with BuildSketch(Plane(origin=(12, 0, 16.5), x_dir=(0, 1, 0), z_dir=(0, 0, -1))) as fillet2_piece_5_section:
        with BuildLine():
            Bezier((FILLET2_SIZE_2, 0), (0, 0), (0, -FILLET2_SIZE), weights=[1, 0.707106781, 1])
            Line((0, -FILLET2_SIZE), (0, 0))
            Line((0, 0), (FILLET2_SIZE_2, 0))
        make_face()
    fillet2_piece_5 = extrude(amount=7.5, mode=Mode.PRIVATE)
    fillet2_piece_5 = split(fillet2_piece_5, bisect_by=Plane(origin=(11.340638125, 5.113048077, 12.5), z_dir=(0, 0, 1)), keep=Keep.TOP, mode=Mode.PRIVATE)
    add(fillet2_piece_5)
    with BuildSketch(Plane(origin=(12, 0, 16.5), x_dir=(0, 1, 0), z_dir=(0, 0, -1))) as fillet2_piece_6_section:
        with BuildLine():
            Bezier((FILLET2_SIZE_2, 0), (0, 0), (0, -FILLET2_SIZE), weights=[1, 0.707106781, 1])
            Line((0, -FILLET2_SIZE), (0, 0))
            Line((0, 0), (FILLET2_SIZE_2, 0))
        make_face()
    fillet2_piece_6 = extrude(amount=7.5, mode=Mode.PRIVATE)
    fillet2_piece_6 = split(fillet2_piece_6, bisect_by=Plane(origin=(11.34063903, 5.113050451, 12.5), z_dir=(0, 0, -1)), keep=Keep.TOP, mode=Mode.PRIVATE)
    add(fillet2_piece_6)
    with BuildSketch(Plane(origin=(12, 0, 16.5), x_dir=(0, 1, 0), z_dir=(0, 0, -1))) as fillet2_piece_7_section:
        with BuildLine():
            Bezier((FILLET2_SIZE_2, 0), (0, 0), (0, -FILLET2_SIZE), weights=[1, 0.707106781, 1])
            Line((0, -FILLET2_SIZE), (0, 0))
            Line((0, 0), (FILLET2_SIZE_2, 0))
        make_face()
    fillet2_piece_7 = extrude(amount=52.5, mode=Mode.PRIVATE)
    fillet2_piece_7 = split(fillet2_piece_7, bisect_by=Plane(origin=(11.340644798, 5.113037249, -9), z_dir=(0, 0, -1)), keep=Keep.TOP, mode=Mode.PRIVATE)
    fillet2_piece_7 = split(fillet2_piece_7, bisect_by=Plane(origin=(11.340644798, 5.113037249, -12.5), z_dir=(0, 0, 1)), keep=Keep.TOP, mode=Mode.PRIVATE)
    add(fillet2_piece_7)
    with BuildSketch(Plane(origin=(12, 0, 16.5), x_dir=(0, 1, 0), z_dir=(0, 0, -1))) as fillet2_piece_8_section:
        with BuildLine():
            Bezier((FILLET2_SIZE_2, 0), (0, 0), (0, -FILLET2_SIZE), weights=[1, 0.707106781, 1])
            Line((0, -FILLET2_SIZE), (0, 0))
            Line((0, 0), (FILLET2_SIZE_2, 0))
        make_face()
    fillet2_piece_8 = extrude(amount=52.5, mode=Mode.PRIVATE)
    fillet2_piece_8 = split(fillet2_piece_8, bisect_by=Plane(origin=(11.340644798, 5.113037249, -16.5), z_dir=(0, 0, 1)), keep=Keep.TOP, mode=Mode.PRIVATE)
    fillet2_piece_8 = split(fillet2_piece_8, bisect_by=Plane(origin=(11.340644798, 5.113037249, -12.5), z_dir=(0, 0, -1)), keep=Keep.TOP, mode=Mode.PRIVATE)
    add(fillet2_piece_8)


solid = part.part
